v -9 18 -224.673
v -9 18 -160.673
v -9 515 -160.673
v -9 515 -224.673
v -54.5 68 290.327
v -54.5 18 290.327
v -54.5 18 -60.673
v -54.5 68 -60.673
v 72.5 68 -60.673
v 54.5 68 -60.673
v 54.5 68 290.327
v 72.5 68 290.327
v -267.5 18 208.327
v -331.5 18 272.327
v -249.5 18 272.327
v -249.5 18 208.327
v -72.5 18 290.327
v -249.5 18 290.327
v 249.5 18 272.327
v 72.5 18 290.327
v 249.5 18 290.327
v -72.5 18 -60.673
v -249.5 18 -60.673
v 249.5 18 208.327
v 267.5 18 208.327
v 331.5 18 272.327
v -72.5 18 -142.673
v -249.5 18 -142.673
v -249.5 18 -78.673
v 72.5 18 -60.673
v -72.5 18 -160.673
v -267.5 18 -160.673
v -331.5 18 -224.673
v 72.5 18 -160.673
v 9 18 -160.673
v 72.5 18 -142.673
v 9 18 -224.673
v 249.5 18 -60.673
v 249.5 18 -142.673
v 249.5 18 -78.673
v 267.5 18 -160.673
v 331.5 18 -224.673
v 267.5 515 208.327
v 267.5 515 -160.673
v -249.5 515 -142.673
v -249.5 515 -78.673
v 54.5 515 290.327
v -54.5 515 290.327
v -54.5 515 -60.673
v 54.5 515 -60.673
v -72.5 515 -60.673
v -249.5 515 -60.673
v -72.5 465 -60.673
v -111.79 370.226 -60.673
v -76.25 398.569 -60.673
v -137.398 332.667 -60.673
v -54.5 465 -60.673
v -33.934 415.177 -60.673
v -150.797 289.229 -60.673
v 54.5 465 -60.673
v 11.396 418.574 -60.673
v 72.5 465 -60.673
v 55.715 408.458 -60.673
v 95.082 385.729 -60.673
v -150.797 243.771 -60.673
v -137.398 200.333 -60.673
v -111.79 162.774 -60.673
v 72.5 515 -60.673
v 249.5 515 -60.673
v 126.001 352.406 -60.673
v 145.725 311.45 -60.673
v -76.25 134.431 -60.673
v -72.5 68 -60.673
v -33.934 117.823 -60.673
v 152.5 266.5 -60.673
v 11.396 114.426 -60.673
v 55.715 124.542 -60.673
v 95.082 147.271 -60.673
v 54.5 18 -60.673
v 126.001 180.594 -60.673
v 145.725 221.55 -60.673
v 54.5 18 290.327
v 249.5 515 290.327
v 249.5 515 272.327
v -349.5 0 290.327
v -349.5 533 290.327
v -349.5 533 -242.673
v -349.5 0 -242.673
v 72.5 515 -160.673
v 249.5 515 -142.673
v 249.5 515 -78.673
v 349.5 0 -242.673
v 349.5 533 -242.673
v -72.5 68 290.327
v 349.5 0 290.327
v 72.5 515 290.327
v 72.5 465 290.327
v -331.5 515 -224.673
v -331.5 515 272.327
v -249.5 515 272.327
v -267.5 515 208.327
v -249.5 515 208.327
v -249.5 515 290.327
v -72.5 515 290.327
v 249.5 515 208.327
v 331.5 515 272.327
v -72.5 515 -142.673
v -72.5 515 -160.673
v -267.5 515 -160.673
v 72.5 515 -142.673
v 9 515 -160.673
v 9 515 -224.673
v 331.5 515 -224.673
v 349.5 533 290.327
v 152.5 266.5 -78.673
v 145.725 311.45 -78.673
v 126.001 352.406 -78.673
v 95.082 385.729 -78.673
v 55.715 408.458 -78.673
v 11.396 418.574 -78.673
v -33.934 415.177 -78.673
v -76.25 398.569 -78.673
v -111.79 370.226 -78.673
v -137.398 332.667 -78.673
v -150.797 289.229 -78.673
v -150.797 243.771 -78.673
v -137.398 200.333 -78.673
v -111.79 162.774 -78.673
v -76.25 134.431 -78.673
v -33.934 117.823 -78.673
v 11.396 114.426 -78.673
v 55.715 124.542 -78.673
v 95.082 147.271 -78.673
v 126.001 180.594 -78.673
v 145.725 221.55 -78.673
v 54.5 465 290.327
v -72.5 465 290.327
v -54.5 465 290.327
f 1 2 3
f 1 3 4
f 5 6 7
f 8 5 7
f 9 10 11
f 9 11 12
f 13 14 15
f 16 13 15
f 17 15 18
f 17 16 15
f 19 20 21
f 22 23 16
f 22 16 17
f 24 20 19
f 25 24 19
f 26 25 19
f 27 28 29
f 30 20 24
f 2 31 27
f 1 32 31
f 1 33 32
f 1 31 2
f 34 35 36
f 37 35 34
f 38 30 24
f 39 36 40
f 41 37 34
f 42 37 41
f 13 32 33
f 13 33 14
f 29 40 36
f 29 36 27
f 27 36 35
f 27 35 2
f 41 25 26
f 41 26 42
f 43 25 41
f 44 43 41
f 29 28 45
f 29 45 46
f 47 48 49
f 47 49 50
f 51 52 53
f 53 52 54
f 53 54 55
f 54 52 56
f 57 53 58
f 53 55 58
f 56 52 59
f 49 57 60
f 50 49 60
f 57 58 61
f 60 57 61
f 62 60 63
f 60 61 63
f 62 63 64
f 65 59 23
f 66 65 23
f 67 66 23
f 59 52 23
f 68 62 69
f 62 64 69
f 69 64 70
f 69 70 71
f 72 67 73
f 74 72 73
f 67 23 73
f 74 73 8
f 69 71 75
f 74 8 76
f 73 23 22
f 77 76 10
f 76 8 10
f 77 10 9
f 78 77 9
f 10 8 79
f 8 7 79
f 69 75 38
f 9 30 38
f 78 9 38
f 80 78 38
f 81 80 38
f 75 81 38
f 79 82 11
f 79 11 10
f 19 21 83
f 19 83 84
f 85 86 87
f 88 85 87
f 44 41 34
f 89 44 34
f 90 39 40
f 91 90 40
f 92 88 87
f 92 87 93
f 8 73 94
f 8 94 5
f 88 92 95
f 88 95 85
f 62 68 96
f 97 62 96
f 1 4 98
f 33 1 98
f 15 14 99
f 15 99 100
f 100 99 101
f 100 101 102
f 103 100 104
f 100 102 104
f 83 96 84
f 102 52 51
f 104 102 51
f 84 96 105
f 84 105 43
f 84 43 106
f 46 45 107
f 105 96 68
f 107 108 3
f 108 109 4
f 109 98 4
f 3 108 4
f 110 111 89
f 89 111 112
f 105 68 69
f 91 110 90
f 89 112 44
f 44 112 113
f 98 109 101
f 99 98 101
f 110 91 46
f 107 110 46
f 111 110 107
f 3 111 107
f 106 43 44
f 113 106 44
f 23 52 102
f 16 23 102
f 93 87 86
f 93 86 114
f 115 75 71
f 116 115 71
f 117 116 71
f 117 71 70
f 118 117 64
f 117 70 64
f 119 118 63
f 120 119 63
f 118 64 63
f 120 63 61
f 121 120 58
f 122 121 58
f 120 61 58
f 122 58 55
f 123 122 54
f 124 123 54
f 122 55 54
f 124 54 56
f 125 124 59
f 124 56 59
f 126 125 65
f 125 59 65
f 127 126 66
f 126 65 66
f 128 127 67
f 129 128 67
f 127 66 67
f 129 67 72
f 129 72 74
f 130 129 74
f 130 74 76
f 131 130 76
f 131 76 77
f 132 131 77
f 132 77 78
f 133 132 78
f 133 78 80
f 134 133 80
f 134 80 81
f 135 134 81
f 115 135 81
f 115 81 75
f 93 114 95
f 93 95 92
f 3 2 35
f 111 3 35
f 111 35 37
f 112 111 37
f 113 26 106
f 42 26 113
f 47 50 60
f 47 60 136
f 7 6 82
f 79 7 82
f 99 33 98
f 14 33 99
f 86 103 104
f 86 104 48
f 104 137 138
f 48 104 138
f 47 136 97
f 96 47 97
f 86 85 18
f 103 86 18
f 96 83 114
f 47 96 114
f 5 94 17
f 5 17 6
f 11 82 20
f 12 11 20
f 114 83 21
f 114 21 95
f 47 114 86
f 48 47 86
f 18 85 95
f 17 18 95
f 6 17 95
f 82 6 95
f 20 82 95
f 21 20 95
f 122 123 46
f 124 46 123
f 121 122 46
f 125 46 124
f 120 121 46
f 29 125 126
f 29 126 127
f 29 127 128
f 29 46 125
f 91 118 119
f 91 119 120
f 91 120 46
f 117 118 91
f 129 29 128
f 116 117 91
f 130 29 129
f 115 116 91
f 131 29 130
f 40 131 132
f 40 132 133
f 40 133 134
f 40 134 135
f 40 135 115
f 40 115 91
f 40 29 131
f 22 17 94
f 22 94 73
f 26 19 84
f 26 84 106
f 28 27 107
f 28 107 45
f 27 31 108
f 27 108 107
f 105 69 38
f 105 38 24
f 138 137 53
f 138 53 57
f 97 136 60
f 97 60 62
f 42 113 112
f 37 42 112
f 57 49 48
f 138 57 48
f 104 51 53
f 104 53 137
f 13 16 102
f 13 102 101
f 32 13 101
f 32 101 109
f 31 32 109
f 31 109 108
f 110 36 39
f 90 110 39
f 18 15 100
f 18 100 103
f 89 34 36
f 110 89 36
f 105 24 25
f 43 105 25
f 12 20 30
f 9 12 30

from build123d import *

# Parameters (mm, degrees)
SKETCH1_W           = 499
SKETCH1_H           = 18
SKETCH1_W_2         = 18
SKETCH1_H_2         = 64
BOSS_EXTRUDE1_DEPTH = 515
SKETCH4_W           = 699
SKETCH4_H           = 533
BOSS_EXTRUDE2_DEPTH = 18
SKETCH5_W           = 699
SKETCH5_H           = 533
BOSS_EXTRUDE3_DEPTH = 18
SKETCH7_W           = 18
SKETCH7_H           = 351
BOSS_EXTRUDE4_DEPTH = 50
SKETCH8_W           = 18
SKETCH8_H           = 351
BOSS_EXTRUDE5_DEPTH = 50
SKETCH9_R           = 152.5
CUT_EXTRUDE1_DEPTH  = 50


with BuildPart() as part:
    # Sketch1 → Boss-Extrude1 (new body)
    with BuildSketch(Plane(origin=(0, 0, 0), x_dir=(1, 0, 0), z_dir=(0, 1, 0))):
        Polygon((249.5, -272.327471245), (331.5, -272.327471245), (331.5, 224.672528755), (-331.5, 224.672528755), (-331.5, -272.327471245), (-249.5, -272.327471245), (-249.5, -290.327471245), (-349.5, -290.327471245), (-349.5, 242.672528755), (349.5, 242.672528755), (349.5, -290.327471245), (249.5, -290.327471245), align=None)
        Polygon((249.5, -208.327471245), (267.5, -208.327471245), (267.5, 160.672528755), (72.5, 160.672528755), (72.5, 142.672528755), (249.5, 142.672528755), align=None)
        with Locations((0, 69.672528755)):
            Rectangle(SKETCH1_W, SKETCH1_H)
        with Locations((0, 192.672528755)):
            Rectangle(SKETCH1_W_2, SKETCH1_H_2)
        Polygon((-249.5, -208.327471245), (-267.5, -208.327471245), (-267.5, 160.672528755), (-72.5, 160.672528755), (-72.5, 142.672528755), (-249.5, 142.672528755), align=None)
    extrude(amount=BOSS_EXTRUDE1_DEPTH)

    # Sketch4 → Boss-Extrude2 (add)
    with BuildSketch(Plane(origin=(0, 0, 0), x_dir=(1, 0, 0), z_dir=(0, 1, 0))):
        with Locations((0, -23.827471245)):
            Rectangle(SKETCH4_W, SKETCH4_H)
    extrude(amount=BOSS_EXTRUDE2_DEPTH)

    # Sketch5 → Boss-Extrude3 (add)
    with BuildSketch(Plane(origin=(0, 515, 0), x_dir=(1, 0, 0), z_dir=(0, 1, 0))):
        with Locations((0, -23.827471245)):
            Rectangle(SKETCH5_W, SKETCH5_H)
    extrude(amount=BOSS_EXTRUDE3_DEPTH)

    # Sketch7 → Boss-Extrude4 (add)
    with BuildSketch(Plane(origin=(0, 18, 0), x_dir=(1, 0, 0), z_dir=(0, 1, 0))):
        with Locations((63.5, -114.827471245)):
            Rectangle(SKETCH7_W, SKETCH7_H)
        with Locations((-63.5, -114.827471245)):
            Rectangle(SKETCH7_W, SKETCH7_H)
    extrude(amount=BOSS_EXTRUDE4_DEPTH)

    # Sketch8 → Boss-Extrude5 (add)
    with BuildSketch(Plane.XZ.offset(-515)):
        with Locations((-63.5, 114.827471245)):
            Rectangle(SKETCH8_W, SKETCH8_H)
        with Locations((63.5, 114.827471245)):
            Rectangle(SKETCH8_W, SKETCH8_H)
    extrude(amount=BOSS_EXTRUDE5_DEPTH)

    # Sketch9 → Cut-Extrude1 (cut)
    with BuildSketch(Plane.XY.offset(-60.672528755)):
        with Locations((0, 266.5)):
            Circle(SKETCH9_R)
    extrude(amount=-CUT_EXTRUDE1_DEPTH, mode=Mode.SUBTRACT)


solid = part.part
